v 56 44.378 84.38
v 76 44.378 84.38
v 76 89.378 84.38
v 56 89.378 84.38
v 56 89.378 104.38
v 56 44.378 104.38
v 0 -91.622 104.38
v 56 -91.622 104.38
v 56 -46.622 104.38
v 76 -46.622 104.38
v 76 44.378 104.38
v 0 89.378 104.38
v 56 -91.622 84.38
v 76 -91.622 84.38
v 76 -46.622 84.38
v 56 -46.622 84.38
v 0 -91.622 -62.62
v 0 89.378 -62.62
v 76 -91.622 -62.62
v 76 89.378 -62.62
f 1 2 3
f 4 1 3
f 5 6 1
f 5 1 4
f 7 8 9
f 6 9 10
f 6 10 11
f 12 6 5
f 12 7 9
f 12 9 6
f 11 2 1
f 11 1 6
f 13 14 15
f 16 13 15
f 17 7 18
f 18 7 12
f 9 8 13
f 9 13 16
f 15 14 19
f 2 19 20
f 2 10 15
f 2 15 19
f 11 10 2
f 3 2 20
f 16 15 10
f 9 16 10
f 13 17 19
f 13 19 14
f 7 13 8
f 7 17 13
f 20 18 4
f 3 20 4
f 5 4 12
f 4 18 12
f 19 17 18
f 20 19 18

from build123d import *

# Parameters (mm, degrees)
F0_W     = 181
F0_H     = 167
F1_DEPTH = 76
F2_W     = 45
F2_H     = 20
F3_DEPTH = 20
F4_W     = 45
F4_H     = 20
F5_DEPTH = 20


with BuildPart() as f1:
    # F0 (on Right) → F1 (new body)
    with BuildSketch(Plane.YZ):
        with Locations((-1.121614, 20.87992)):
            Rectangle(F0_W, F0_H)
    extrude(amount=F1_DEPTH)

    # F2 (on face) → F3 (cut)
    with BuildSketch(Plane.YZ.offset(76)):
        with Locations((-69.121614, 94.37992)):
            Rectangle(F2_W, F2_H)
    extrude(amount=-F3_DEPTH, mode=Mode.SUBTRACT)

    # F4 (on face) → F5 (cut)
    with BuildSketch(Plane.YZ.offset(76)):
        with Locations((66.878386, 94.37992)):
            Rectangle(F4_W, F4_H)
    extrude(amount=-F5_DEPTH, mode=Mode.SUBTRACT)


solid = f1.part
